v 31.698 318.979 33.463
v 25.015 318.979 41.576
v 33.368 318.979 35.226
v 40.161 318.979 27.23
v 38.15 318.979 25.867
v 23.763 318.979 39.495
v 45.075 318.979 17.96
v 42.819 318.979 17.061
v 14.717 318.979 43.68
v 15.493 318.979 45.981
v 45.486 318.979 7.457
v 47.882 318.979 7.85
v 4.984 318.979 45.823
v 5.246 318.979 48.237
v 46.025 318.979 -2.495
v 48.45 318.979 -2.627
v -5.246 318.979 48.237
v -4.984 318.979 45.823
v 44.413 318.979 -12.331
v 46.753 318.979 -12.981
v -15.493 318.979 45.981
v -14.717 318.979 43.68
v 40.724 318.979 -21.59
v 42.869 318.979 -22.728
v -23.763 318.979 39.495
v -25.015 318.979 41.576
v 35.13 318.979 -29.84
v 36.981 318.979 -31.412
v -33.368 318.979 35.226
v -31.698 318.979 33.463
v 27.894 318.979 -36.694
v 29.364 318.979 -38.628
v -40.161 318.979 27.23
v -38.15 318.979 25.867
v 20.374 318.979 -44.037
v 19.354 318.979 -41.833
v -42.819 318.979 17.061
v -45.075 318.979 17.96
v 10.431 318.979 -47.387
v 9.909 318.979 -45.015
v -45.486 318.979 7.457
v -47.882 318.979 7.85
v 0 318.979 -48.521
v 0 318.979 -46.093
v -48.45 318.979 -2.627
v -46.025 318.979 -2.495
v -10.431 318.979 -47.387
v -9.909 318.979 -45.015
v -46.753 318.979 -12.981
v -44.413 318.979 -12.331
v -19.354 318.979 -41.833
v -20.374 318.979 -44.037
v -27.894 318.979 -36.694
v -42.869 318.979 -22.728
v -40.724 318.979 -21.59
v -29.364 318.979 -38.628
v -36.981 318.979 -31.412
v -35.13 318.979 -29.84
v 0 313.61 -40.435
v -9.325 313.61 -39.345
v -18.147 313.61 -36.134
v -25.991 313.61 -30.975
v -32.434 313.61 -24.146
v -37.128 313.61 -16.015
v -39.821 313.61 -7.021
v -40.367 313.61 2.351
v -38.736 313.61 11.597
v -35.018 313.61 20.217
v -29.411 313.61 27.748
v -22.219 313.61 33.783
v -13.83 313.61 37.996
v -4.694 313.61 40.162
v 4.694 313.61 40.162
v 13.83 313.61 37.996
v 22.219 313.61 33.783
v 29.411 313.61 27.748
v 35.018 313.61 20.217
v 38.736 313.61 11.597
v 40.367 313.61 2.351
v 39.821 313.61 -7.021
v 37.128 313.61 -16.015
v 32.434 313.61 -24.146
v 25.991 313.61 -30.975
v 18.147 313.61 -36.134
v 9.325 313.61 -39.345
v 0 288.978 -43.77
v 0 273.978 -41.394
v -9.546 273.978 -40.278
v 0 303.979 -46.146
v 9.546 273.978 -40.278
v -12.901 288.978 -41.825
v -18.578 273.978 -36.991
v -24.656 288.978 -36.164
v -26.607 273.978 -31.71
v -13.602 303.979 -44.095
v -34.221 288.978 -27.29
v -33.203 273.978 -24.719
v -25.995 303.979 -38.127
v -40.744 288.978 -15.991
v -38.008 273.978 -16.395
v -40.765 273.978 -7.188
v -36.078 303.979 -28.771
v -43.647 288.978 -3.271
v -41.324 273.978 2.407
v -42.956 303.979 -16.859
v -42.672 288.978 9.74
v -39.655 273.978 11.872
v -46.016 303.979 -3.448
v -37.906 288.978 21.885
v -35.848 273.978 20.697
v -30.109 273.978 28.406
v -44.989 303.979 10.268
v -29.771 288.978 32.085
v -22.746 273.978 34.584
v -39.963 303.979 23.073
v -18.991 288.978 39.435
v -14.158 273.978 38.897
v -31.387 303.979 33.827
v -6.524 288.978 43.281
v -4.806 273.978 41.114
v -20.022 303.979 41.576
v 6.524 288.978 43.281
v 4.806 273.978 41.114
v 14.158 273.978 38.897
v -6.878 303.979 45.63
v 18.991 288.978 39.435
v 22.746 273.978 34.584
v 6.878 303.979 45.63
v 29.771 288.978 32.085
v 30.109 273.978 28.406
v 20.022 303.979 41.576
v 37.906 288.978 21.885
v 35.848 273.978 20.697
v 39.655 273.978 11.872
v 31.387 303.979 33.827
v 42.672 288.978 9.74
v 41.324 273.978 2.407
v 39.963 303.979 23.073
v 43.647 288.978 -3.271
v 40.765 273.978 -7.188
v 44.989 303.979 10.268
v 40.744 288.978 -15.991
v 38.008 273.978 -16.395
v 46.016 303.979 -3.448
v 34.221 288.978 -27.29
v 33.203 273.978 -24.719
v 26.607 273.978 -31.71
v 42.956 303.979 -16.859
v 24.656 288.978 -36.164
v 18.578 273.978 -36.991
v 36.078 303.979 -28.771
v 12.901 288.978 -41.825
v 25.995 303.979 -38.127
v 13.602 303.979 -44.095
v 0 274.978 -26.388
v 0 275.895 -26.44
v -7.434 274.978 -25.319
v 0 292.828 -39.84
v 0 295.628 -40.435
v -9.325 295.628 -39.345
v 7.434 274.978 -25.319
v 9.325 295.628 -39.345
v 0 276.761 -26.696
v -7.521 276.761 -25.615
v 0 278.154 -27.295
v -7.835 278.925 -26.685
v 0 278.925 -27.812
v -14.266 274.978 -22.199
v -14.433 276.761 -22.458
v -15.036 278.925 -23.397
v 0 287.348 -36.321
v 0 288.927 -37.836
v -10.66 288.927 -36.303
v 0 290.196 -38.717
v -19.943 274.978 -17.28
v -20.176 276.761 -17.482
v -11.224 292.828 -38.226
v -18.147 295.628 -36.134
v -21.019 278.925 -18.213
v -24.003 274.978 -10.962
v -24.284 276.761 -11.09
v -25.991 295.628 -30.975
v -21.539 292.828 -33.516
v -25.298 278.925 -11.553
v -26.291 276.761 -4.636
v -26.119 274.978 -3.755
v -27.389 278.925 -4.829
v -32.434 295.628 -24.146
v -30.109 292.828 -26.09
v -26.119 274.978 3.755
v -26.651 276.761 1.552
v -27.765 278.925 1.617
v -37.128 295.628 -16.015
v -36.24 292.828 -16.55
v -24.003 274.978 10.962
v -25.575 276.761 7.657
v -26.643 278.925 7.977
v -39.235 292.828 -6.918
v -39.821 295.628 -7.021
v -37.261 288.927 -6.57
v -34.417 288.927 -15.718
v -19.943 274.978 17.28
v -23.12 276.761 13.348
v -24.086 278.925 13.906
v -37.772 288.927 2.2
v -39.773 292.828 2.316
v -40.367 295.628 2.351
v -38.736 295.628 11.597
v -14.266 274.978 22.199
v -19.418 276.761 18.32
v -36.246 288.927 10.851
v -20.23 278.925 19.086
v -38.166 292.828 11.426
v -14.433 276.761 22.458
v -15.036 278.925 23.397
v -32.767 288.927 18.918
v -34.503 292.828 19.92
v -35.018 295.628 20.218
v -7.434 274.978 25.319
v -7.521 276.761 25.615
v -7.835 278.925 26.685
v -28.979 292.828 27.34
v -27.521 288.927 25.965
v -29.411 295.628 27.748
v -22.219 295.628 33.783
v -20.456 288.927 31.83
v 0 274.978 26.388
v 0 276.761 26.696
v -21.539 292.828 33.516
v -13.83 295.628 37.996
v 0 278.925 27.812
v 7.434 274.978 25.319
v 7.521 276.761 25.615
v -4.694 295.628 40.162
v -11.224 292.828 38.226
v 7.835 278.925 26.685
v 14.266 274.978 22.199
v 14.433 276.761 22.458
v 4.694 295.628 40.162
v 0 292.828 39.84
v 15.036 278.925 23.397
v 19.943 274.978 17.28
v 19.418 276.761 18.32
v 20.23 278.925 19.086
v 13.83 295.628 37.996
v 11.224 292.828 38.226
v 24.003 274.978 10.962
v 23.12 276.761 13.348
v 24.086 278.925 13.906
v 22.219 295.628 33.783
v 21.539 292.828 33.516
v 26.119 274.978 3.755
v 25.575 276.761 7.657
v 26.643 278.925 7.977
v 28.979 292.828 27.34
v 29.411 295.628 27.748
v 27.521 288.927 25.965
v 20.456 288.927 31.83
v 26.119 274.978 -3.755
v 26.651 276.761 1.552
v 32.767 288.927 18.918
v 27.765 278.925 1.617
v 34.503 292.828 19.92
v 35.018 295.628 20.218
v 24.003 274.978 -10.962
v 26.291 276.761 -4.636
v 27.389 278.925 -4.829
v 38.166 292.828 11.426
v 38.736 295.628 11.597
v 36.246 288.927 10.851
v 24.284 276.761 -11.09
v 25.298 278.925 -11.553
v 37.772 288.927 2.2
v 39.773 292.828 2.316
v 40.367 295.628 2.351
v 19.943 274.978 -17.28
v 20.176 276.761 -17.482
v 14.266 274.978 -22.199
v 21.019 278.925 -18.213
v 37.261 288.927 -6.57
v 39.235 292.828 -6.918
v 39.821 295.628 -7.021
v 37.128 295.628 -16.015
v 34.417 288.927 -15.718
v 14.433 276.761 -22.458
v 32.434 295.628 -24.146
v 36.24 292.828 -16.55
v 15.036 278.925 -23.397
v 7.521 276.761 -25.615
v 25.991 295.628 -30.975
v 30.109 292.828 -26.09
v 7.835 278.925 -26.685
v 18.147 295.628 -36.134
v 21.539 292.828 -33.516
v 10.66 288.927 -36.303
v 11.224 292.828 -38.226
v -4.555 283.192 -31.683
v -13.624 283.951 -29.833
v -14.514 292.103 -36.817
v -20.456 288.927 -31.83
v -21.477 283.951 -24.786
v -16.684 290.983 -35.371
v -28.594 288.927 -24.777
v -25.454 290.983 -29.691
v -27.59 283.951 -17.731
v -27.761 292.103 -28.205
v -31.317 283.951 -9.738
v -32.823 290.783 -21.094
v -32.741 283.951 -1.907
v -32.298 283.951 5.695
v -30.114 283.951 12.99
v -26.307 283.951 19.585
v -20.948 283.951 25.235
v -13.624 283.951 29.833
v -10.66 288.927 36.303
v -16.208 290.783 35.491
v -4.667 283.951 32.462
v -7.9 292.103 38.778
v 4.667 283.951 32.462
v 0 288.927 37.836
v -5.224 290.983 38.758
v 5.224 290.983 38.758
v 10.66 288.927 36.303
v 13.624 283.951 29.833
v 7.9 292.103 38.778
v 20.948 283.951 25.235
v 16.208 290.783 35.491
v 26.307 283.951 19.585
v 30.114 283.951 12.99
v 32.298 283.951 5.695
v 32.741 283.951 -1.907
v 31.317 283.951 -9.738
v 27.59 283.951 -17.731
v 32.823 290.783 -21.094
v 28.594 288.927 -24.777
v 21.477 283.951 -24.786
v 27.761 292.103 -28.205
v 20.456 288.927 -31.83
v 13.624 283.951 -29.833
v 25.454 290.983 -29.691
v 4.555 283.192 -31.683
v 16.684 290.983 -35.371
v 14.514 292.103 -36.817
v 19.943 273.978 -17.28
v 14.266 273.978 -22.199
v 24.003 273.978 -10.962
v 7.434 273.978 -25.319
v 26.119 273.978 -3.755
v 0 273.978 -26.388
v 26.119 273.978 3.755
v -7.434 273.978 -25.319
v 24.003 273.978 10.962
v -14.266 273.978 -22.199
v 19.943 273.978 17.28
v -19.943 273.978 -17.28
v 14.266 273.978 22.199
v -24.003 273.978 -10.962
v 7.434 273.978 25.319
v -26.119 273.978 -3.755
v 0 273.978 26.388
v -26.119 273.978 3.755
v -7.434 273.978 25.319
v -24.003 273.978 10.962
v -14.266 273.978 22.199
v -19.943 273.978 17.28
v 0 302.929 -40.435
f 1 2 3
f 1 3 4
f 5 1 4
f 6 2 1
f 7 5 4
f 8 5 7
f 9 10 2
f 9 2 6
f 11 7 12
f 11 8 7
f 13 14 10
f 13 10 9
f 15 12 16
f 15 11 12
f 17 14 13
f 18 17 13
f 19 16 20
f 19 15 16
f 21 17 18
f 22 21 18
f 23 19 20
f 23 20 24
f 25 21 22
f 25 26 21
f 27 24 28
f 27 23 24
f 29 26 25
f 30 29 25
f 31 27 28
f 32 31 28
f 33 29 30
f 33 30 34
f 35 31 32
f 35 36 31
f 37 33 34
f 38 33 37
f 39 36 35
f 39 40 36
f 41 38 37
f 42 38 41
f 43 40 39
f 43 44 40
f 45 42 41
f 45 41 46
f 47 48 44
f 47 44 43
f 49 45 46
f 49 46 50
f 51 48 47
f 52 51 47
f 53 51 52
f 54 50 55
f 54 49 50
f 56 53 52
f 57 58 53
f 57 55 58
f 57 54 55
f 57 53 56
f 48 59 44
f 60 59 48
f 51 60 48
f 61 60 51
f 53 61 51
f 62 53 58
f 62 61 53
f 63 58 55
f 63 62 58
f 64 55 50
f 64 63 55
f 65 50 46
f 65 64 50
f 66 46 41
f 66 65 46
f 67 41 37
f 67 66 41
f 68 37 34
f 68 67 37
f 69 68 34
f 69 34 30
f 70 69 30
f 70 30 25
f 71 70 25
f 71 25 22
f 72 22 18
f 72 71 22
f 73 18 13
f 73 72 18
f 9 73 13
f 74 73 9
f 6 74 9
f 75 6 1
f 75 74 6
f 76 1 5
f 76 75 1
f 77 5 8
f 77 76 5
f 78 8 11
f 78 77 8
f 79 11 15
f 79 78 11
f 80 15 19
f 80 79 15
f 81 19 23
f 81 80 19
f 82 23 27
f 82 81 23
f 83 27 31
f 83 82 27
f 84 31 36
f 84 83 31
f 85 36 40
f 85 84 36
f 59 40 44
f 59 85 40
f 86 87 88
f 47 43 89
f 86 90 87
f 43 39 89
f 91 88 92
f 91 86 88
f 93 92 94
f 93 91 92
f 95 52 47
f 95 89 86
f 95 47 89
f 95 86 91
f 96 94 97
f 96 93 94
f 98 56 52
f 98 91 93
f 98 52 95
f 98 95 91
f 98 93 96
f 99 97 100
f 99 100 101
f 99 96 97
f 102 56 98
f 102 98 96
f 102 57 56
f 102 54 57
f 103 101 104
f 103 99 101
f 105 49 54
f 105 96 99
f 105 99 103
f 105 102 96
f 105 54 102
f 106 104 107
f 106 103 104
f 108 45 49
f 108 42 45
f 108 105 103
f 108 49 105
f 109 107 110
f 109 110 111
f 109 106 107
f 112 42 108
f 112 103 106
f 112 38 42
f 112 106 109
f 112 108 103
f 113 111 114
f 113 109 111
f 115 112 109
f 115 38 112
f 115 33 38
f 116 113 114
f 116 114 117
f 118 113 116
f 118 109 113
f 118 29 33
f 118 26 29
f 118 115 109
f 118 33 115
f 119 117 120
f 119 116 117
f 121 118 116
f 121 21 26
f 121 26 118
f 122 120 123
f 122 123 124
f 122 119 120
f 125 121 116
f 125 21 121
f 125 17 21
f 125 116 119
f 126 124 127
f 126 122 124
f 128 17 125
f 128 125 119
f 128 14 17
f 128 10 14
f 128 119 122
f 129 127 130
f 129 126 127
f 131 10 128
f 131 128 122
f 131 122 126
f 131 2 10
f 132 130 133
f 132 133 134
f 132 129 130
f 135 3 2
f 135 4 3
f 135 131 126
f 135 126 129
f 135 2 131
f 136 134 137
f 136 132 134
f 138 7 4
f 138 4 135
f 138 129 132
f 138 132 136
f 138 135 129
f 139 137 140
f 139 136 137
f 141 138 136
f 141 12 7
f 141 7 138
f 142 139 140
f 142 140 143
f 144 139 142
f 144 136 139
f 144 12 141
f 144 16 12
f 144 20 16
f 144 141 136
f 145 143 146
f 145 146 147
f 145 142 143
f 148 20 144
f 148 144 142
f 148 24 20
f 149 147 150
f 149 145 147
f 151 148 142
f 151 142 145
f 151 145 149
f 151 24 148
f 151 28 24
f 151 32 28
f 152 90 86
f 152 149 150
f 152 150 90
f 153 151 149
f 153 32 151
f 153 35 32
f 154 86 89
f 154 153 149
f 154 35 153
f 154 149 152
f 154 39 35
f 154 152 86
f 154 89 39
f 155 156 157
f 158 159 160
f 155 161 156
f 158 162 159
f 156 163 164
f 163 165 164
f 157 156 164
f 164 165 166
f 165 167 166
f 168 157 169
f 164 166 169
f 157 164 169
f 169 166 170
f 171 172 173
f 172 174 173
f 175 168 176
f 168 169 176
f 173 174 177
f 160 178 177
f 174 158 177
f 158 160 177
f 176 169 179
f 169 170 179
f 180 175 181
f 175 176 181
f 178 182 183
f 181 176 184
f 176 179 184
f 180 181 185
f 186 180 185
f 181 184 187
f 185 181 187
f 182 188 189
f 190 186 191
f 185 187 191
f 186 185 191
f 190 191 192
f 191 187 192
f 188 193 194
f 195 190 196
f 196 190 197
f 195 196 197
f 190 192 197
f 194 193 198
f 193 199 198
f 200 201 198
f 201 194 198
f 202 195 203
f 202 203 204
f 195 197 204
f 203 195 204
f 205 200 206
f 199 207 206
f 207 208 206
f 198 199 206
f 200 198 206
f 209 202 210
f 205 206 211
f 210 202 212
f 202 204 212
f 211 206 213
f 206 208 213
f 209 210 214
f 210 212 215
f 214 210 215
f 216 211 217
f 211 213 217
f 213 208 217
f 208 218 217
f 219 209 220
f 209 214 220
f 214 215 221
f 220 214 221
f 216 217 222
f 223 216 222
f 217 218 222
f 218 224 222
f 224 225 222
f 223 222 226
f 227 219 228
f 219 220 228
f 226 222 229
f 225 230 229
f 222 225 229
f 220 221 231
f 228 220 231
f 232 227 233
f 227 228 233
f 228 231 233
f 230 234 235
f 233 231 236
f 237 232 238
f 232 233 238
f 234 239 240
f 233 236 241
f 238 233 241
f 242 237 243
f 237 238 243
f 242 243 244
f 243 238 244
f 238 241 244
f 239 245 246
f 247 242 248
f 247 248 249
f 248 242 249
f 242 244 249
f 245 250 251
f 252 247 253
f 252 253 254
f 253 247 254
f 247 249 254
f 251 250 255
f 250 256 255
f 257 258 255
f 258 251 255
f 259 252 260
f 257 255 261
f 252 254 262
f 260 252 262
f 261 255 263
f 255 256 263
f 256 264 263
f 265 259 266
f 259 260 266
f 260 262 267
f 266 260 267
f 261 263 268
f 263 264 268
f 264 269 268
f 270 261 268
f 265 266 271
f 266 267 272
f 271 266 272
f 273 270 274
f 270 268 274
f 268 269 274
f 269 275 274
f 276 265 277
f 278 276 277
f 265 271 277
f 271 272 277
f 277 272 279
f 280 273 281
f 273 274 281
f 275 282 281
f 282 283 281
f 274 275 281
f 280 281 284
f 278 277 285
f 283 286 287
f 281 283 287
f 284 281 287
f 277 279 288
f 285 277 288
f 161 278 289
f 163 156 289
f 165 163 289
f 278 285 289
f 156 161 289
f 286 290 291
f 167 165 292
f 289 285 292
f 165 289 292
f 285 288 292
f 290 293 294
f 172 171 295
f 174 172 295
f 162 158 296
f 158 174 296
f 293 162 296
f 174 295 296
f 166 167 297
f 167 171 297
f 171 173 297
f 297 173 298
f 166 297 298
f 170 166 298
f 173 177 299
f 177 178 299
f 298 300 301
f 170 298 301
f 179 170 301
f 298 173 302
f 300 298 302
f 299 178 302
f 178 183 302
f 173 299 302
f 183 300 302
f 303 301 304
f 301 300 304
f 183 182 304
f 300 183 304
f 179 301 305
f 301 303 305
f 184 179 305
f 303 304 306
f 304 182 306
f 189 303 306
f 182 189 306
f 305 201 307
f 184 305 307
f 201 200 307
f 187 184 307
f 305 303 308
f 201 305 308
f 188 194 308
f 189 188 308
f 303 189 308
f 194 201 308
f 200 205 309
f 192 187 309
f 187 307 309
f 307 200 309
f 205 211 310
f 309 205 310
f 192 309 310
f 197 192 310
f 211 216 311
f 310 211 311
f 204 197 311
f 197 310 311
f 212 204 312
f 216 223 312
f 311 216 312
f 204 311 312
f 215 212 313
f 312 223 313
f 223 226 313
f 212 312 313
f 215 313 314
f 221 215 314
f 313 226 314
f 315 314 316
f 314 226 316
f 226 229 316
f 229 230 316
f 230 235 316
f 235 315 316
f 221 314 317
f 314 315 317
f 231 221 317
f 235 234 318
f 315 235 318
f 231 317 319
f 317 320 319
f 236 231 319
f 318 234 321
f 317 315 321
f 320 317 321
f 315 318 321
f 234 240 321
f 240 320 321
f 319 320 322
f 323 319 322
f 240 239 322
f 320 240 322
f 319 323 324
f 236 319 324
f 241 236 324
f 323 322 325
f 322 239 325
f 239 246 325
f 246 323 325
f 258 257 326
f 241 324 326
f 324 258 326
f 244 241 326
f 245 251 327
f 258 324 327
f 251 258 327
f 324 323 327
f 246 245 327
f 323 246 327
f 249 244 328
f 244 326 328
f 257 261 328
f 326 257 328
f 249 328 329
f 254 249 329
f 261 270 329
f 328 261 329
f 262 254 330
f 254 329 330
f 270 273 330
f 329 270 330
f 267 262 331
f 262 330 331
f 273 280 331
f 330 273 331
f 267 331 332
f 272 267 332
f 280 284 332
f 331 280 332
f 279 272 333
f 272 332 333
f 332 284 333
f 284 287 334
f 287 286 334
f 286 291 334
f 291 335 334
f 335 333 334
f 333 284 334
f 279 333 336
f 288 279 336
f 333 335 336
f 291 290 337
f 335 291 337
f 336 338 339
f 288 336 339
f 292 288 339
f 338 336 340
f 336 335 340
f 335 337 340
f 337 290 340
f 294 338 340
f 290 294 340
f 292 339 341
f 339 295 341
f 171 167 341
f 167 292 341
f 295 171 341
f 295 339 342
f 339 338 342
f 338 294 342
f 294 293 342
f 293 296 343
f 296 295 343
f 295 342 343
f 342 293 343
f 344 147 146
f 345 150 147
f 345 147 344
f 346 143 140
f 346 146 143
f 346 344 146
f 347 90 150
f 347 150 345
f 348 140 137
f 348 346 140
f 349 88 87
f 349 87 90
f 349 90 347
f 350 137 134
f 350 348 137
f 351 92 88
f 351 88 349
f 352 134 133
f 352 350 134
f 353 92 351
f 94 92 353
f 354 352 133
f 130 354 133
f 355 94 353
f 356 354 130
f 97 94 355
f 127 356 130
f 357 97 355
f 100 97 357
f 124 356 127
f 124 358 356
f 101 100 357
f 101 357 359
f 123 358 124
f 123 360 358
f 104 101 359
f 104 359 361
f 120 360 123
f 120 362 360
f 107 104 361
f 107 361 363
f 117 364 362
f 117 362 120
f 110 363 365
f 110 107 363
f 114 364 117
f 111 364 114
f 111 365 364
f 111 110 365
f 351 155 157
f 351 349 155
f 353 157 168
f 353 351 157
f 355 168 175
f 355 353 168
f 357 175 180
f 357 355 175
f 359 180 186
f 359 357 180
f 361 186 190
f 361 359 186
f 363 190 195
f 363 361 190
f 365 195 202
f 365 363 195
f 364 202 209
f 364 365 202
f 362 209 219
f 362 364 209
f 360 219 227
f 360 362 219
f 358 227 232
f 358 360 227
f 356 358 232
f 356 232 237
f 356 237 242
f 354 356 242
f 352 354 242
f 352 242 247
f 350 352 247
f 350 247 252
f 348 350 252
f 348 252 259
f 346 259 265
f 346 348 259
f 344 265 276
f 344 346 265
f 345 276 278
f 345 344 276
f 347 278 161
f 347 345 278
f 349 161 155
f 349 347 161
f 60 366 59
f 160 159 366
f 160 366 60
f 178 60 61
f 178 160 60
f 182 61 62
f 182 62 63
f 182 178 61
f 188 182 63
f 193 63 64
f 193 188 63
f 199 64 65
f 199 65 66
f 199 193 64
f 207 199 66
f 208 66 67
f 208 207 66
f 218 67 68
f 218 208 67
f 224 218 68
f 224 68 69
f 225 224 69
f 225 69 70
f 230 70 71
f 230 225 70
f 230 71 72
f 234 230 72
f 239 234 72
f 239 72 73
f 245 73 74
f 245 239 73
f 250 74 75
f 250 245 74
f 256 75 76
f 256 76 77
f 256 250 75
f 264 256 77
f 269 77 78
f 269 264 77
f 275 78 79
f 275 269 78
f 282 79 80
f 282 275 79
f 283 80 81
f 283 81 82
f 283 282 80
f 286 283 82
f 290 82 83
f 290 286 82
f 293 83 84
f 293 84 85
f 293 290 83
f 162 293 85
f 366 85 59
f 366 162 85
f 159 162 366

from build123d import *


with BuildPart() as part:
    # cup → Revolve10 (revolve)
    with BuildSketch(Plane(origin=(0, 0, 0), x_dir=(0, 0, -1), z_dir=(1, 0, 0))):
        with BuildLine():
            Line((26.3877562, 273.977978152), (41.393848749, 273.977978152))
            Line((41.393848749, 273.977978152), (48.521369999, 318.979376237))
            Line((48.521369999, 318.979376237), (46.09278776, 318.979376237))
            Line((46.09278776, 318.979376237), (40.434998933, 313.610335114))
            Line((40.434998933, 313.610335114), (40.434998933, 302.929125624))
            Line((40.434998933, 302.929125624), (40.435001067, 295.628098891))
            add(Edge.make_bspline(
                [(26.3877562, 274.977978152), (26.308069584, 275.856710536), (26.796830662, 277.02873066), (27.443781617, 278.556908896), (28.356699811, 279.511909602), (29.160414421, 280.515150439), (30.174182206, 281.464372876), (31.066815667, 282.438718878), (32.170131949, 283.286750944), (33.123255367, 284.296585872), (34.13106238, 285.346264322), (35.274047285, 286.251458493), (36.223208535, 287.265101835), (37.219500197, 288.227943348), (38.14175611, 289.239215424), (38.901851681, 290.459887567), (39.40949031, 291.690068117), (40.087968636, 293.371695279), (40.264723453, 294.719186571), (40.435001067, 295.628098891)],
                knots=[0, 0, 0, 0, 0.098127883, 0.147997761, 0.191547501, 0.250818037, 0.298129775, 0.35332526, 0.404730279, 0.459927689, 0.515124716, 0.574396505, 0.629590541, 0.67690421, 0.736176363, 0.788774743, 0.843690475, 0.891327752, 1, 1, 1, 1], degree=3))
            Line((26.3877562, 274.977978152), (26.3877562, 273.977978152))
        make_face()
    revolve(axis=Axis((0, 0, 0), (0, 1, 0)))


solid = part.part
